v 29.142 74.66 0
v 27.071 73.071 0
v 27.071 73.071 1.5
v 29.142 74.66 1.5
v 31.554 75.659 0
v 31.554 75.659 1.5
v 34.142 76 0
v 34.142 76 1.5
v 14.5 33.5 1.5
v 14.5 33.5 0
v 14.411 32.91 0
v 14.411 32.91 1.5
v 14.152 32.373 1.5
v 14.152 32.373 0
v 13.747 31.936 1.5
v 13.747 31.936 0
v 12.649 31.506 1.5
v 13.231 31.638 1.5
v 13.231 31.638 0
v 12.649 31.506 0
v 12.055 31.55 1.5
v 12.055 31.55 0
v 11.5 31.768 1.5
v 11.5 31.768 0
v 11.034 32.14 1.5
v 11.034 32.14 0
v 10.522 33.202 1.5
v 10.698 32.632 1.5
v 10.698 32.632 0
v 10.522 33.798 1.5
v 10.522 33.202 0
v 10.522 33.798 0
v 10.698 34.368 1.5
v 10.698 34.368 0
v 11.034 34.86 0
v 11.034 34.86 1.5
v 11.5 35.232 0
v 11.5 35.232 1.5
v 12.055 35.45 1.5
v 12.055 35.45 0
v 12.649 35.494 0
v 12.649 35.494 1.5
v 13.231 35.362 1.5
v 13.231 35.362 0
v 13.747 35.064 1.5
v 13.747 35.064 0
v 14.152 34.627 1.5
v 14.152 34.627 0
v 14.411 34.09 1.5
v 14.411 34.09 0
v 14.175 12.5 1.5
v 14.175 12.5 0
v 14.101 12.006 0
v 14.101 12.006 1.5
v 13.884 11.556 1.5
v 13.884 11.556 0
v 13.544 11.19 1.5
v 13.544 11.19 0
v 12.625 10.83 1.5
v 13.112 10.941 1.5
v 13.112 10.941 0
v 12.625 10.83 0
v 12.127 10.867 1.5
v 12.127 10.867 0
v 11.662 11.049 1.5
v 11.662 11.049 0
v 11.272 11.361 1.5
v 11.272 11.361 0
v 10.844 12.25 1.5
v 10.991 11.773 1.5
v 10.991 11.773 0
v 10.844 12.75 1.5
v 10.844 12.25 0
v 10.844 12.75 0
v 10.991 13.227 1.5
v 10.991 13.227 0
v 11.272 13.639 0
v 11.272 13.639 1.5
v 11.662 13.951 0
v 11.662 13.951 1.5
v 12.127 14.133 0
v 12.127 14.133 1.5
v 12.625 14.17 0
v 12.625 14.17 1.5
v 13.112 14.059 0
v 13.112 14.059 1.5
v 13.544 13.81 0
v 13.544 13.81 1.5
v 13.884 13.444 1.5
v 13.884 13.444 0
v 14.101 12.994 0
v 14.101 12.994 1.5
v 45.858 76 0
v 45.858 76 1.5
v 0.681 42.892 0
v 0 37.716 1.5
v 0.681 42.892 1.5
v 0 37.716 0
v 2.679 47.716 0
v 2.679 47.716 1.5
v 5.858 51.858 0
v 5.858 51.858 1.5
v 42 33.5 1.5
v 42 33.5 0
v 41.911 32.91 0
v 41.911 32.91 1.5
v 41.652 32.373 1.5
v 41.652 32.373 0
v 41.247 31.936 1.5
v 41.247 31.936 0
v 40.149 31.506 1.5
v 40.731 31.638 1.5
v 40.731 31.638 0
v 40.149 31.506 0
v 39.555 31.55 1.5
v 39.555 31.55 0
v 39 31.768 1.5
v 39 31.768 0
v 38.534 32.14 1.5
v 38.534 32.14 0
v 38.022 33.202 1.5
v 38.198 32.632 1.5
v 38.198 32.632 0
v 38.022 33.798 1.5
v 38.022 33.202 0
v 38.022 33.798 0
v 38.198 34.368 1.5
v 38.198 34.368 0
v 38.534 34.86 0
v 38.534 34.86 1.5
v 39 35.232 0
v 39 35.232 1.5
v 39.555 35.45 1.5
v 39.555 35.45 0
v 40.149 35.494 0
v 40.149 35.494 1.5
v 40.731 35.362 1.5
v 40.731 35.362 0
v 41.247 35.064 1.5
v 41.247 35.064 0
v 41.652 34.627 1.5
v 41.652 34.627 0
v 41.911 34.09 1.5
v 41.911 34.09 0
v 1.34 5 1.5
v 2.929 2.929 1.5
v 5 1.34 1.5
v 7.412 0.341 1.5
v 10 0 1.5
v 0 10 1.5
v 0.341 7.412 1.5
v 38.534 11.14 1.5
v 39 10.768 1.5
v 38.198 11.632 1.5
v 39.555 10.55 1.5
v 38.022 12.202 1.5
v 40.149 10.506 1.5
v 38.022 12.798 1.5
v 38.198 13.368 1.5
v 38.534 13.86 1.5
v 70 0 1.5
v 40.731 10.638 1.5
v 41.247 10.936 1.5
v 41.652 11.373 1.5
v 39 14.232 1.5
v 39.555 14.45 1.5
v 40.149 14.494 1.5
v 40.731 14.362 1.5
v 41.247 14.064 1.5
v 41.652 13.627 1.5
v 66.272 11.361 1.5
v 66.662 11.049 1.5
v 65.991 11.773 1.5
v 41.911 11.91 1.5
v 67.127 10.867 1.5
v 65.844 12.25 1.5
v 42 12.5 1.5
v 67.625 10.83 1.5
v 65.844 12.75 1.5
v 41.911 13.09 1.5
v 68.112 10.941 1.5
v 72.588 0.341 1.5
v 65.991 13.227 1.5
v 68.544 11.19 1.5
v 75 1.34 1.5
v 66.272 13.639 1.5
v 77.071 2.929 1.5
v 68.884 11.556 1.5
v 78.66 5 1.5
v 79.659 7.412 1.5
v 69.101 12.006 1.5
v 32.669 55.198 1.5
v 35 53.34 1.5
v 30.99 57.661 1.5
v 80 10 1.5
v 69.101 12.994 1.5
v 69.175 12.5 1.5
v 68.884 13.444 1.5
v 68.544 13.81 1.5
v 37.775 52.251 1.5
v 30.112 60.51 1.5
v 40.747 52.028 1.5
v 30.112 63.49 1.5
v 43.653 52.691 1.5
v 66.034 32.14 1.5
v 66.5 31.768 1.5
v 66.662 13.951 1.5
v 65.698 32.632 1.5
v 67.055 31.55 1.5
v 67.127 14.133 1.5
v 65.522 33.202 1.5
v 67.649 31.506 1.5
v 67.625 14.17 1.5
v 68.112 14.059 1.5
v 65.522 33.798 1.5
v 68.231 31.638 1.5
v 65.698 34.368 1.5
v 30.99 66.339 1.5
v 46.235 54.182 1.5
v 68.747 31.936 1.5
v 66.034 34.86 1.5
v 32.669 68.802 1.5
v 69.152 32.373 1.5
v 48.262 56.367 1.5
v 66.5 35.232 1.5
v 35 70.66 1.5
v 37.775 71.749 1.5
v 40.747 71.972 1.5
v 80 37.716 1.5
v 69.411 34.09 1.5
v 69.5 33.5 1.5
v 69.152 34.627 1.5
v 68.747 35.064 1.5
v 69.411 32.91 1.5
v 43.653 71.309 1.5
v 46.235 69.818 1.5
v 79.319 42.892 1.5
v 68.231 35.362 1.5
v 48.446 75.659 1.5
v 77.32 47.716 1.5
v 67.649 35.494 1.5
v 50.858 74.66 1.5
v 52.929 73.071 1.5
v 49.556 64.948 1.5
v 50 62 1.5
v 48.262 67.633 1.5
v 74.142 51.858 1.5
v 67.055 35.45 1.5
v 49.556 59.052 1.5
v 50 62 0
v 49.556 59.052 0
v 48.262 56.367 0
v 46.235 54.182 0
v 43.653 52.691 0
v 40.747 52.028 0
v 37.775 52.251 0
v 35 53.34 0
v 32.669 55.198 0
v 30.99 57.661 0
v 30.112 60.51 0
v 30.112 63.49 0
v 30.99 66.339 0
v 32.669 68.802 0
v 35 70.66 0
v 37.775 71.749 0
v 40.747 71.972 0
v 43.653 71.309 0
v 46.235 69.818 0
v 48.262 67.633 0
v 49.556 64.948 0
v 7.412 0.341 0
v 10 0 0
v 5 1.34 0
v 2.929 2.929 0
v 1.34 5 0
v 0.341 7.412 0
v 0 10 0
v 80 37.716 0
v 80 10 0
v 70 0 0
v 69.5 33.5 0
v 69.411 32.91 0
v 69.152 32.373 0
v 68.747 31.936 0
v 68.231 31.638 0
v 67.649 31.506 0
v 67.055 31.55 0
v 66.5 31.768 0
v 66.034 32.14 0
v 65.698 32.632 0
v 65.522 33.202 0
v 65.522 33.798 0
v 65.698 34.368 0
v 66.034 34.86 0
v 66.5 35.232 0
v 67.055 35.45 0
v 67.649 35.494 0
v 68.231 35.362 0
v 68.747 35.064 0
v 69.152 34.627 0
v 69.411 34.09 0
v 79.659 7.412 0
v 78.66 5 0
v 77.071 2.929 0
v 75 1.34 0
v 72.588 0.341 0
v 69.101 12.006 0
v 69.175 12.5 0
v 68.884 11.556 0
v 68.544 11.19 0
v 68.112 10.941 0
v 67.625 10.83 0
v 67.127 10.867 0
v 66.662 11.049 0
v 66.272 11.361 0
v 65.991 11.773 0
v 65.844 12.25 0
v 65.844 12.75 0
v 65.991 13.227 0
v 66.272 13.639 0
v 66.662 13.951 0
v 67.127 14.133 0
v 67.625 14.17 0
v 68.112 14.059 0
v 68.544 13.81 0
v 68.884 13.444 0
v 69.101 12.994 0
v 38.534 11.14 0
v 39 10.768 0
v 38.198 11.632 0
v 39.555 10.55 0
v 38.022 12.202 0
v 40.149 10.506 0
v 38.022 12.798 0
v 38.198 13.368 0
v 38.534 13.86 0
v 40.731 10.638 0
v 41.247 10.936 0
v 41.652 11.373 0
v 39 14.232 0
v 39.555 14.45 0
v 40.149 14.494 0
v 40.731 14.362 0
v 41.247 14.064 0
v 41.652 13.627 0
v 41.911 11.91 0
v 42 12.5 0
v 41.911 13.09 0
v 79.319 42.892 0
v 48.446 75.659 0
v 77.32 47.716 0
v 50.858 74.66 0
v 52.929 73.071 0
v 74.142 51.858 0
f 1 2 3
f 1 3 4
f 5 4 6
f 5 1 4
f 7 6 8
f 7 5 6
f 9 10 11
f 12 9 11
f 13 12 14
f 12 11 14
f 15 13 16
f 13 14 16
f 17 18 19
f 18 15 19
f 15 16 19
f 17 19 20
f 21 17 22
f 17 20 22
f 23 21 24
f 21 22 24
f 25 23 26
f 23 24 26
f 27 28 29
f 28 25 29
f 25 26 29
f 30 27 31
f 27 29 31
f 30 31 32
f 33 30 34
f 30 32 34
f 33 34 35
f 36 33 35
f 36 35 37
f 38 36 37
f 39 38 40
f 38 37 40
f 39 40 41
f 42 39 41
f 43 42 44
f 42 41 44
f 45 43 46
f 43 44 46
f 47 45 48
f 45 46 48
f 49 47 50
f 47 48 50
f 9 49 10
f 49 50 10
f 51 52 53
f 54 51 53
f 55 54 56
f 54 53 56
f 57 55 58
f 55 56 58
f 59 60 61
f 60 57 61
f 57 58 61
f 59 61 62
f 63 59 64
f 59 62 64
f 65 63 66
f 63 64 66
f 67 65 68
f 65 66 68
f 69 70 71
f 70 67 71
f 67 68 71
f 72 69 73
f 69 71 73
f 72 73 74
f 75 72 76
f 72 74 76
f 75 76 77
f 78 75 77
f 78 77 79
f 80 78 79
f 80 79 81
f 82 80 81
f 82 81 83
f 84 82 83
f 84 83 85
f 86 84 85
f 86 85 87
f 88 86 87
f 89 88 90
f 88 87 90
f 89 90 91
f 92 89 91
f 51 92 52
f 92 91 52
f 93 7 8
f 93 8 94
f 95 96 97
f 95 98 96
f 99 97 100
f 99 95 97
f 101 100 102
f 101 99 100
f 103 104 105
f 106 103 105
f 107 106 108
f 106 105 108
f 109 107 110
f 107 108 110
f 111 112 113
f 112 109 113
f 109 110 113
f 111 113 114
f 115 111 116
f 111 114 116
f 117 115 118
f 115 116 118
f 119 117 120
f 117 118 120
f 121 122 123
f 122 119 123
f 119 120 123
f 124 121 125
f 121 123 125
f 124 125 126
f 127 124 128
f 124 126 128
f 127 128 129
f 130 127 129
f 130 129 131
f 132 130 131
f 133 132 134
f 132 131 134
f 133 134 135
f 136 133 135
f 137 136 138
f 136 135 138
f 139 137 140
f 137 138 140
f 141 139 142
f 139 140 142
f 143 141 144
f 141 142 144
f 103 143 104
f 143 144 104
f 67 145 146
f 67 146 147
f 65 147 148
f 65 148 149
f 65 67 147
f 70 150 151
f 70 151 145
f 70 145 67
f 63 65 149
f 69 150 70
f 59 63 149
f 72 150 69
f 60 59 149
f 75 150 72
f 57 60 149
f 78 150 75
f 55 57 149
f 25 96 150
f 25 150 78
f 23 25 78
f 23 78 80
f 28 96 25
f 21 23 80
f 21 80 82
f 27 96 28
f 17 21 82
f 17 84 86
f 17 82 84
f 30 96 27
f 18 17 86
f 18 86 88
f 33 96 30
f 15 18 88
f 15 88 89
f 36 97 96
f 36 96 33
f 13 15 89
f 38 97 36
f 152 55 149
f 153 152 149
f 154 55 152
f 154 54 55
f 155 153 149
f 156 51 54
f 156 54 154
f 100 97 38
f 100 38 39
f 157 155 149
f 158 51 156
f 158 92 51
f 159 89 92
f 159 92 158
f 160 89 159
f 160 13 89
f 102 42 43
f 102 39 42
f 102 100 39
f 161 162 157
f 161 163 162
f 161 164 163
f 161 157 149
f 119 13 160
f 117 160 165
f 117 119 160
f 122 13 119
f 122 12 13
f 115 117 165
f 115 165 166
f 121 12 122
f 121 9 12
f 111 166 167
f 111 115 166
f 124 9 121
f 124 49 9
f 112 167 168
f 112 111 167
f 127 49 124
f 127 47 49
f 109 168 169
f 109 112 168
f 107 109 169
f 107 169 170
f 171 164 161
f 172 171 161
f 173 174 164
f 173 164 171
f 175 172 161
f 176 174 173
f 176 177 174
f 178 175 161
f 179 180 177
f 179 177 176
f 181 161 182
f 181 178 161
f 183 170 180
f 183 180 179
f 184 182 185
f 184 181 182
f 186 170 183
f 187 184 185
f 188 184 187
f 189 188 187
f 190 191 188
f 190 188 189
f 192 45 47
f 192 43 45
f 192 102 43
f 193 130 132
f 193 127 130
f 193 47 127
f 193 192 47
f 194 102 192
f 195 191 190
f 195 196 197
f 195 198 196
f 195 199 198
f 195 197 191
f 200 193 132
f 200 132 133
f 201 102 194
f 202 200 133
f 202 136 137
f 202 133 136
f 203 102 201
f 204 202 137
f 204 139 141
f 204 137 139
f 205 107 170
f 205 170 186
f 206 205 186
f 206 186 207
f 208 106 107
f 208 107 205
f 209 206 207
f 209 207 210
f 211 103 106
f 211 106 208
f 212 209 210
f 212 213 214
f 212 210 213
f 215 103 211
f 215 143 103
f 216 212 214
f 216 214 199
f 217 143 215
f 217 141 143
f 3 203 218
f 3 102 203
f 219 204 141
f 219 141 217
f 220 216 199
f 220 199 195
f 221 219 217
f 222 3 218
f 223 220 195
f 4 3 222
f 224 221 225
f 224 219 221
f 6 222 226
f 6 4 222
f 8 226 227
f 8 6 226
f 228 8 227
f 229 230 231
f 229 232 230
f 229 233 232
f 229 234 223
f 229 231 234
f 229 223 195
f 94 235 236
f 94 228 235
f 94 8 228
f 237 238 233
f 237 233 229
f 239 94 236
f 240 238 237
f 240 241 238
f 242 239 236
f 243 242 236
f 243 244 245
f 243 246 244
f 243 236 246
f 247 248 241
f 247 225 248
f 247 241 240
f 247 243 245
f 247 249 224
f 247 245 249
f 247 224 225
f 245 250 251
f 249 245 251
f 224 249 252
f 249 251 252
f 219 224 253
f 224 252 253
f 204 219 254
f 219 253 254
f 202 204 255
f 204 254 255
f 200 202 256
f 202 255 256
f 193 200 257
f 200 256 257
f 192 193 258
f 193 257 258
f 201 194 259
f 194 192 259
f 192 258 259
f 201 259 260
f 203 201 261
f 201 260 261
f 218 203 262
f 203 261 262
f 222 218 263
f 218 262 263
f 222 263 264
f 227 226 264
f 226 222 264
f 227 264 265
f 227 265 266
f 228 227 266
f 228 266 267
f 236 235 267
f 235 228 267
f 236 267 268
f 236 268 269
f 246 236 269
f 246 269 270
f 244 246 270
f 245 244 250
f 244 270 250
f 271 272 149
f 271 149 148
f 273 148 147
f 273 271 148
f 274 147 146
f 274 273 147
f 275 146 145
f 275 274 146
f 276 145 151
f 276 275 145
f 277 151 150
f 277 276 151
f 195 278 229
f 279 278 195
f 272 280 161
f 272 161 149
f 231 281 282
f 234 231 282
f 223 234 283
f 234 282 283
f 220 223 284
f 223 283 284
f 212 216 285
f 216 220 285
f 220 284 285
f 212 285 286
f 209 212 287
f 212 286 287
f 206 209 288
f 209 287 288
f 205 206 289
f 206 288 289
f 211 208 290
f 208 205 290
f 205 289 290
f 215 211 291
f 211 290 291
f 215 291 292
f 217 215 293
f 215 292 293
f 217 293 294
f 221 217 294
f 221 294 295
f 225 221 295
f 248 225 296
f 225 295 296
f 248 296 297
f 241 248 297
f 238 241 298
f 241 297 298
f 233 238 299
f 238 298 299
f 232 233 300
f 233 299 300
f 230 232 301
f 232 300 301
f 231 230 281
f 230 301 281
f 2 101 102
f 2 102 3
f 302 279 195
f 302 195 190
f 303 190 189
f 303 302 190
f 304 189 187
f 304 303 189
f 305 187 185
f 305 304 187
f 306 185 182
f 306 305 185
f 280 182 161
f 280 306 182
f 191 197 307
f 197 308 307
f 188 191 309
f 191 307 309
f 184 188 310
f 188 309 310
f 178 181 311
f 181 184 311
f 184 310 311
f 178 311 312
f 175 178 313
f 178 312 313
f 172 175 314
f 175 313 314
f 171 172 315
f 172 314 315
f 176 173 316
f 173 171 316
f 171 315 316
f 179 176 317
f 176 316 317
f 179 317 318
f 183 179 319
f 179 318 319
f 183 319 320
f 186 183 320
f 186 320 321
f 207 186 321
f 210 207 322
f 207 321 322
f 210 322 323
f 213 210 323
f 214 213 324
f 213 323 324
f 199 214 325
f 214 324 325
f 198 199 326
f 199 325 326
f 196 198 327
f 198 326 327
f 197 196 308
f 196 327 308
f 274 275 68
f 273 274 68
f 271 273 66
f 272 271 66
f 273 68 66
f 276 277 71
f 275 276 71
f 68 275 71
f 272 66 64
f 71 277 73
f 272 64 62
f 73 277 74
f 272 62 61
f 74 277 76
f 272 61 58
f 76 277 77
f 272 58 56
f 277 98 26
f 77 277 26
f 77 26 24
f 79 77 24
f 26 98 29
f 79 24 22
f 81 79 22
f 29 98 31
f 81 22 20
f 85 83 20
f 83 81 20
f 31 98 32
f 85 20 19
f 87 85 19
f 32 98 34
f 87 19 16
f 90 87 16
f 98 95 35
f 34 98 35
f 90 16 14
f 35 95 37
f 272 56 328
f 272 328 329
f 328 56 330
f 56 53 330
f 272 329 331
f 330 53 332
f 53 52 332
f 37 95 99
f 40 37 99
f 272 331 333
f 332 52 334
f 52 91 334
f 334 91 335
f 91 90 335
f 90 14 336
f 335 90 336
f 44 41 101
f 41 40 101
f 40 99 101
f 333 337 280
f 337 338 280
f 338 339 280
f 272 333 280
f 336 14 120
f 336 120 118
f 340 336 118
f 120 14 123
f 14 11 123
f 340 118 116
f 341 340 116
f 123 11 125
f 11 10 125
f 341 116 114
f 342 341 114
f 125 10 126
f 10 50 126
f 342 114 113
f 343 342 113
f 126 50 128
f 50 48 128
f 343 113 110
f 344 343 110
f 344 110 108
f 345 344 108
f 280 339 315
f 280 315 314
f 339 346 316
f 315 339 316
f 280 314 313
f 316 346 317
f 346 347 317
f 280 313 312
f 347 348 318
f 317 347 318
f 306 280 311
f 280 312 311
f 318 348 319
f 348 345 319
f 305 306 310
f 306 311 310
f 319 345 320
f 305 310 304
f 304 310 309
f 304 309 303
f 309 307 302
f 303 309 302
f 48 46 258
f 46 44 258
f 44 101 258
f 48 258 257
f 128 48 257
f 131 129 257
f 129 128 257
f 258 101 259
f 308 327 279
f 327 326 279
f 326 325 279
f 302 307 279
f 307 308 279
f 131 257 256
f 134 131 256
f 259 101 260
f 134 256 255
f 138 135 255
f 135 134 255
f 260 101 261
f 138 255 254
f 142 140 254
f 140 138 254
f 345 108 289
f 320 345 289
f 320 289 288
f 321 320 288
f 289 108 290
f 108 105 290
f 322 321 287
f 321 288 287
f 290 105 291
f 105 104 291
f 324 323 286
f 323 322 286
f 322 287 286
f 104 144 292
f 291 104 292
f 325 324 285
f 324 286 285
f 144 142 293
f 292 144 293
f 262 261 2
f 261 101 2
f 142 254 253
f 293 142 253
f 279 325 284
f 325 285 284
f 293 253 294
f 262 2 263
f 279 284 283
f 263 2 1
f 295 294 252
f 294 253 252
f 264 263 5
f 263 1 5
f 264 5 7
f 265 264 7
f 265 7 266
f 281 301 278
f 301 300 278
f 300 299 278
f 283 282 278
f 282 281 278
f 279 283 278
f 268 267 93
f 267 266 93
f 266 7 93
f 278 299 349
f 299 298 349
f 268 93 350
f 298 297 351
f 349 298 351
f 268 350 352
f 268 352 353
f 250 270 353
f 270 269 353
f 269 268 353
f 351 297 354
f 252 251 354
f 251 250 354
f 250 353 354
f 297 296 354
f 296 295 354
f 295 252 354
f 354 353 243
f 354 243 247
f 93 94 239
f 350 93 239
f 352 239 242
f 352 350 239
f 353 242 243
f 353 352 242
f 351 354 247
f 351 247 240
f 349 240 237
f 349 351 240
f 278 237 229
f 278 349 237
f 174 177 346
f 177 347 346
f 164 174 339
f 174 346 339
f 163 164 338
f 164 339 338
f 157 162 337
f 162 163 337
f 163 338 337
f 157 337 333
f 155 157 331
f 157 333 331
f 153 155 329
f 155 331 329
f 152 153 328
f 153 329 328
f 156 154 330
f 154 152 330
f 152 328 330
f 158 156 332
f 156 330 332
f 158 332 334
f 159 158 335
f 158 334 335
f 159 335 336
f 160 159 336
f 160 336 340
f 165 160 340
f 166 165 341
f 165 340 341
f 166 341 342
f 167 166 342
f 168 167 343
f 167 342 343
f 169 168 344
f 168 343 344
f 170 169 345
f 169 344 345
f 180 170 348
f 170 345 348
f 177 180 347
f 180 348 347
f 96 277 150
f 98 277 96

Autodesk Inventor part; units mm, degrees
ref_plane "YZ Plane" through (0, 0, 0) normal (1, 0, 0) x (0, 1, 0)
ref_plane "XZ Plane" through (0, 0, 0) normal (0, 1, 0) x (-1, 0, 0)
ref_plane "XY Plane" through (0, 0, 0) normal (0, 0, 1) x (1, 0, 0)
sketch "Sketch1" plane through (0, 0, 0) normal (0, 0, 1) x (1, 0, 0)
  line L0 (0, 10) -> (0, 37.7157)
  line L1 (5.8579, 51.8579) -> (27.0711, 73.0711)
  line L2 (34.1421, 76) -> (45.8579, 76)
  line L3 (52.9289, 73.0711) -> (74.1421, 51.8579)
  line L4 (80, 37.7157) -> (80, 10)
  line L5 (70, 0) -> (10, 0)
  circle A0 centre (12.5, 12.5) radius 1.675
  circle A1 centre (67.5, 12.5) radius 1.675
  circle A2 centre (67.5, 33.5) radius 2
  circle A3 centre (12.5, 33.5) radius 2
  circle A4 centre (40, 12.5) radius 2
  circle A5 centre (40, 33.5) radius 2
  circle A6 centre (40, 62) radius 10
  arc A7 (5.8579, 51.8579) -> (0, 37.7157) centre (20, 37.7157) ccw
  arc A8 (0, 10) -> (10, 0) centre (10, 10) ccw
  arc A9 (70, 0) -> (80, 10) centre (70, 10) ccw
  arc A10 (80, 37.7157) -> (74.1421, 51.8579) centre (60, 37.7157) ccw
  arc A11 (34.1421, 76) -> (27.0711, 73.0711) centre (34.1421, 66) ccw
  arc A12 (52.9289, 73.0711) -> (45.8579, 76) centre (45.8579, 66) ccw
  point P0 (0, 0)
  point P1 (0, 46)
  point P2 (30, 76)
  point P3 (50, 76)
  point P4 (80, 46)
  point P5 (80, 0)
  point P6 (40, 0)
  point P7 (40, 76)
  dimension "d0" = 46
  dimension "d1" = 46
  dimension "d2" = 80
  dimension "d3" = 30
  dimension "d4" = 30
  dimension "d5" = 30
  dimension "d6" = 3.35
  dimension "d10" = 3.35
  dimension "d12" = 12.5
  dimension "d13" = 12.5
  dimension "d14" = 12.5
  dimension "d15" = 12.5
  dimension "d16" = 4
  dimension "d18" = 12.5
  dimension "d19" = 12.5
  dimension "d20" = 4
  dimension "d22" = 12.5
  dimension "d23" = 12.5
  dimension "d25" = 4
  dimension "d27" = 12.5
  dimension "d28" = 4
  dimension "d30" = 20
  dimension "d31" = 14
  dimension "d32" = 20
  dimension "d33" = 40
  dimension "d34" = 40
  dimension "d35" = 10
  dimension "d36" = 10
  dimension "d37" = 20
  dimension "d38" = 10
  dimension "d39" = 10
extrude "Plate1" add sketch "Sketch1" along normal blind 1.5
equation "\"d0\" = A_width"
equation "\"d1\" = A_width"
equation "\"d6\" = rivet_diameter"
equation "\"d10\" = rivet_diameter"
equation "\"d12\" = rivet_wall_clearance"
equation "\"d13\" = rivet_wall_clearance"
equation "\"d14\" = rivet_wall_clearance"
equation "\"d15\" = rivet_wall_clearance"
equation "\"d16\" = d17"
equation "\"d18\" = rivet_wall_clearance"
equation "\"d19\" = rivet_wall_clearance"
equation "\"d20\" = d21"
equation "\"d22\" = rivet_wall_clearance"
equation "\"d23\" = rivet_wall_clearance"
equation "\"d25\" = d26"
equation "\"d27\" = rivet_wall_clearance"
equation "\"d28\" = d29"
equation "\"d24\" = Thickness"
equation "\"BendRadius\" = Thickness"
equation "\"BendReliefWidth\" = Thickness"
equation "\"BendReliefDepth\" = 0.5 * Thickness"
equation "\"CornerReliefSize\" = 4 * Thickness"
equation "\"MinimumRemnant\" = 2 * Thickness"
equation "\"TransitionRadius\" = BendRadius"
equation "\"JacobiRadiusSize\" = BendRadius"
equation "\"GapSize\" = Thickness"
equation "\"A_width\" = 46"
equation "\"A_joint_diameter\" = 16"
equation "\"A_joint_tolerance\" = 3"
equation "\"l___________\" = 0"
equation "\"l__________\" = 0"
equation "\"l_________\" = 0"
equation "\"rivet_diameter\" = 3.35"
equation "\"plate_thickness\" = 3"
equation "\"l________\" = 0"
equation "\"L_Piston_Top\" = 25"
equation "\"L_Piston_Bottom\" = 21"
equation "\"rivet_wall_clearance\" = 12.5"
equation "\"thin_plate\" = 1.5"
equation "\"A_B_spacing\" = 2"
equation "\"d17\" = 4"
equation "\"d21\" = 4"
equation "\"d26\" = 4"
equation "\"d29\" = 4"
equation "\"Thickness\" = 1.5"
properties part number "sideplate"
